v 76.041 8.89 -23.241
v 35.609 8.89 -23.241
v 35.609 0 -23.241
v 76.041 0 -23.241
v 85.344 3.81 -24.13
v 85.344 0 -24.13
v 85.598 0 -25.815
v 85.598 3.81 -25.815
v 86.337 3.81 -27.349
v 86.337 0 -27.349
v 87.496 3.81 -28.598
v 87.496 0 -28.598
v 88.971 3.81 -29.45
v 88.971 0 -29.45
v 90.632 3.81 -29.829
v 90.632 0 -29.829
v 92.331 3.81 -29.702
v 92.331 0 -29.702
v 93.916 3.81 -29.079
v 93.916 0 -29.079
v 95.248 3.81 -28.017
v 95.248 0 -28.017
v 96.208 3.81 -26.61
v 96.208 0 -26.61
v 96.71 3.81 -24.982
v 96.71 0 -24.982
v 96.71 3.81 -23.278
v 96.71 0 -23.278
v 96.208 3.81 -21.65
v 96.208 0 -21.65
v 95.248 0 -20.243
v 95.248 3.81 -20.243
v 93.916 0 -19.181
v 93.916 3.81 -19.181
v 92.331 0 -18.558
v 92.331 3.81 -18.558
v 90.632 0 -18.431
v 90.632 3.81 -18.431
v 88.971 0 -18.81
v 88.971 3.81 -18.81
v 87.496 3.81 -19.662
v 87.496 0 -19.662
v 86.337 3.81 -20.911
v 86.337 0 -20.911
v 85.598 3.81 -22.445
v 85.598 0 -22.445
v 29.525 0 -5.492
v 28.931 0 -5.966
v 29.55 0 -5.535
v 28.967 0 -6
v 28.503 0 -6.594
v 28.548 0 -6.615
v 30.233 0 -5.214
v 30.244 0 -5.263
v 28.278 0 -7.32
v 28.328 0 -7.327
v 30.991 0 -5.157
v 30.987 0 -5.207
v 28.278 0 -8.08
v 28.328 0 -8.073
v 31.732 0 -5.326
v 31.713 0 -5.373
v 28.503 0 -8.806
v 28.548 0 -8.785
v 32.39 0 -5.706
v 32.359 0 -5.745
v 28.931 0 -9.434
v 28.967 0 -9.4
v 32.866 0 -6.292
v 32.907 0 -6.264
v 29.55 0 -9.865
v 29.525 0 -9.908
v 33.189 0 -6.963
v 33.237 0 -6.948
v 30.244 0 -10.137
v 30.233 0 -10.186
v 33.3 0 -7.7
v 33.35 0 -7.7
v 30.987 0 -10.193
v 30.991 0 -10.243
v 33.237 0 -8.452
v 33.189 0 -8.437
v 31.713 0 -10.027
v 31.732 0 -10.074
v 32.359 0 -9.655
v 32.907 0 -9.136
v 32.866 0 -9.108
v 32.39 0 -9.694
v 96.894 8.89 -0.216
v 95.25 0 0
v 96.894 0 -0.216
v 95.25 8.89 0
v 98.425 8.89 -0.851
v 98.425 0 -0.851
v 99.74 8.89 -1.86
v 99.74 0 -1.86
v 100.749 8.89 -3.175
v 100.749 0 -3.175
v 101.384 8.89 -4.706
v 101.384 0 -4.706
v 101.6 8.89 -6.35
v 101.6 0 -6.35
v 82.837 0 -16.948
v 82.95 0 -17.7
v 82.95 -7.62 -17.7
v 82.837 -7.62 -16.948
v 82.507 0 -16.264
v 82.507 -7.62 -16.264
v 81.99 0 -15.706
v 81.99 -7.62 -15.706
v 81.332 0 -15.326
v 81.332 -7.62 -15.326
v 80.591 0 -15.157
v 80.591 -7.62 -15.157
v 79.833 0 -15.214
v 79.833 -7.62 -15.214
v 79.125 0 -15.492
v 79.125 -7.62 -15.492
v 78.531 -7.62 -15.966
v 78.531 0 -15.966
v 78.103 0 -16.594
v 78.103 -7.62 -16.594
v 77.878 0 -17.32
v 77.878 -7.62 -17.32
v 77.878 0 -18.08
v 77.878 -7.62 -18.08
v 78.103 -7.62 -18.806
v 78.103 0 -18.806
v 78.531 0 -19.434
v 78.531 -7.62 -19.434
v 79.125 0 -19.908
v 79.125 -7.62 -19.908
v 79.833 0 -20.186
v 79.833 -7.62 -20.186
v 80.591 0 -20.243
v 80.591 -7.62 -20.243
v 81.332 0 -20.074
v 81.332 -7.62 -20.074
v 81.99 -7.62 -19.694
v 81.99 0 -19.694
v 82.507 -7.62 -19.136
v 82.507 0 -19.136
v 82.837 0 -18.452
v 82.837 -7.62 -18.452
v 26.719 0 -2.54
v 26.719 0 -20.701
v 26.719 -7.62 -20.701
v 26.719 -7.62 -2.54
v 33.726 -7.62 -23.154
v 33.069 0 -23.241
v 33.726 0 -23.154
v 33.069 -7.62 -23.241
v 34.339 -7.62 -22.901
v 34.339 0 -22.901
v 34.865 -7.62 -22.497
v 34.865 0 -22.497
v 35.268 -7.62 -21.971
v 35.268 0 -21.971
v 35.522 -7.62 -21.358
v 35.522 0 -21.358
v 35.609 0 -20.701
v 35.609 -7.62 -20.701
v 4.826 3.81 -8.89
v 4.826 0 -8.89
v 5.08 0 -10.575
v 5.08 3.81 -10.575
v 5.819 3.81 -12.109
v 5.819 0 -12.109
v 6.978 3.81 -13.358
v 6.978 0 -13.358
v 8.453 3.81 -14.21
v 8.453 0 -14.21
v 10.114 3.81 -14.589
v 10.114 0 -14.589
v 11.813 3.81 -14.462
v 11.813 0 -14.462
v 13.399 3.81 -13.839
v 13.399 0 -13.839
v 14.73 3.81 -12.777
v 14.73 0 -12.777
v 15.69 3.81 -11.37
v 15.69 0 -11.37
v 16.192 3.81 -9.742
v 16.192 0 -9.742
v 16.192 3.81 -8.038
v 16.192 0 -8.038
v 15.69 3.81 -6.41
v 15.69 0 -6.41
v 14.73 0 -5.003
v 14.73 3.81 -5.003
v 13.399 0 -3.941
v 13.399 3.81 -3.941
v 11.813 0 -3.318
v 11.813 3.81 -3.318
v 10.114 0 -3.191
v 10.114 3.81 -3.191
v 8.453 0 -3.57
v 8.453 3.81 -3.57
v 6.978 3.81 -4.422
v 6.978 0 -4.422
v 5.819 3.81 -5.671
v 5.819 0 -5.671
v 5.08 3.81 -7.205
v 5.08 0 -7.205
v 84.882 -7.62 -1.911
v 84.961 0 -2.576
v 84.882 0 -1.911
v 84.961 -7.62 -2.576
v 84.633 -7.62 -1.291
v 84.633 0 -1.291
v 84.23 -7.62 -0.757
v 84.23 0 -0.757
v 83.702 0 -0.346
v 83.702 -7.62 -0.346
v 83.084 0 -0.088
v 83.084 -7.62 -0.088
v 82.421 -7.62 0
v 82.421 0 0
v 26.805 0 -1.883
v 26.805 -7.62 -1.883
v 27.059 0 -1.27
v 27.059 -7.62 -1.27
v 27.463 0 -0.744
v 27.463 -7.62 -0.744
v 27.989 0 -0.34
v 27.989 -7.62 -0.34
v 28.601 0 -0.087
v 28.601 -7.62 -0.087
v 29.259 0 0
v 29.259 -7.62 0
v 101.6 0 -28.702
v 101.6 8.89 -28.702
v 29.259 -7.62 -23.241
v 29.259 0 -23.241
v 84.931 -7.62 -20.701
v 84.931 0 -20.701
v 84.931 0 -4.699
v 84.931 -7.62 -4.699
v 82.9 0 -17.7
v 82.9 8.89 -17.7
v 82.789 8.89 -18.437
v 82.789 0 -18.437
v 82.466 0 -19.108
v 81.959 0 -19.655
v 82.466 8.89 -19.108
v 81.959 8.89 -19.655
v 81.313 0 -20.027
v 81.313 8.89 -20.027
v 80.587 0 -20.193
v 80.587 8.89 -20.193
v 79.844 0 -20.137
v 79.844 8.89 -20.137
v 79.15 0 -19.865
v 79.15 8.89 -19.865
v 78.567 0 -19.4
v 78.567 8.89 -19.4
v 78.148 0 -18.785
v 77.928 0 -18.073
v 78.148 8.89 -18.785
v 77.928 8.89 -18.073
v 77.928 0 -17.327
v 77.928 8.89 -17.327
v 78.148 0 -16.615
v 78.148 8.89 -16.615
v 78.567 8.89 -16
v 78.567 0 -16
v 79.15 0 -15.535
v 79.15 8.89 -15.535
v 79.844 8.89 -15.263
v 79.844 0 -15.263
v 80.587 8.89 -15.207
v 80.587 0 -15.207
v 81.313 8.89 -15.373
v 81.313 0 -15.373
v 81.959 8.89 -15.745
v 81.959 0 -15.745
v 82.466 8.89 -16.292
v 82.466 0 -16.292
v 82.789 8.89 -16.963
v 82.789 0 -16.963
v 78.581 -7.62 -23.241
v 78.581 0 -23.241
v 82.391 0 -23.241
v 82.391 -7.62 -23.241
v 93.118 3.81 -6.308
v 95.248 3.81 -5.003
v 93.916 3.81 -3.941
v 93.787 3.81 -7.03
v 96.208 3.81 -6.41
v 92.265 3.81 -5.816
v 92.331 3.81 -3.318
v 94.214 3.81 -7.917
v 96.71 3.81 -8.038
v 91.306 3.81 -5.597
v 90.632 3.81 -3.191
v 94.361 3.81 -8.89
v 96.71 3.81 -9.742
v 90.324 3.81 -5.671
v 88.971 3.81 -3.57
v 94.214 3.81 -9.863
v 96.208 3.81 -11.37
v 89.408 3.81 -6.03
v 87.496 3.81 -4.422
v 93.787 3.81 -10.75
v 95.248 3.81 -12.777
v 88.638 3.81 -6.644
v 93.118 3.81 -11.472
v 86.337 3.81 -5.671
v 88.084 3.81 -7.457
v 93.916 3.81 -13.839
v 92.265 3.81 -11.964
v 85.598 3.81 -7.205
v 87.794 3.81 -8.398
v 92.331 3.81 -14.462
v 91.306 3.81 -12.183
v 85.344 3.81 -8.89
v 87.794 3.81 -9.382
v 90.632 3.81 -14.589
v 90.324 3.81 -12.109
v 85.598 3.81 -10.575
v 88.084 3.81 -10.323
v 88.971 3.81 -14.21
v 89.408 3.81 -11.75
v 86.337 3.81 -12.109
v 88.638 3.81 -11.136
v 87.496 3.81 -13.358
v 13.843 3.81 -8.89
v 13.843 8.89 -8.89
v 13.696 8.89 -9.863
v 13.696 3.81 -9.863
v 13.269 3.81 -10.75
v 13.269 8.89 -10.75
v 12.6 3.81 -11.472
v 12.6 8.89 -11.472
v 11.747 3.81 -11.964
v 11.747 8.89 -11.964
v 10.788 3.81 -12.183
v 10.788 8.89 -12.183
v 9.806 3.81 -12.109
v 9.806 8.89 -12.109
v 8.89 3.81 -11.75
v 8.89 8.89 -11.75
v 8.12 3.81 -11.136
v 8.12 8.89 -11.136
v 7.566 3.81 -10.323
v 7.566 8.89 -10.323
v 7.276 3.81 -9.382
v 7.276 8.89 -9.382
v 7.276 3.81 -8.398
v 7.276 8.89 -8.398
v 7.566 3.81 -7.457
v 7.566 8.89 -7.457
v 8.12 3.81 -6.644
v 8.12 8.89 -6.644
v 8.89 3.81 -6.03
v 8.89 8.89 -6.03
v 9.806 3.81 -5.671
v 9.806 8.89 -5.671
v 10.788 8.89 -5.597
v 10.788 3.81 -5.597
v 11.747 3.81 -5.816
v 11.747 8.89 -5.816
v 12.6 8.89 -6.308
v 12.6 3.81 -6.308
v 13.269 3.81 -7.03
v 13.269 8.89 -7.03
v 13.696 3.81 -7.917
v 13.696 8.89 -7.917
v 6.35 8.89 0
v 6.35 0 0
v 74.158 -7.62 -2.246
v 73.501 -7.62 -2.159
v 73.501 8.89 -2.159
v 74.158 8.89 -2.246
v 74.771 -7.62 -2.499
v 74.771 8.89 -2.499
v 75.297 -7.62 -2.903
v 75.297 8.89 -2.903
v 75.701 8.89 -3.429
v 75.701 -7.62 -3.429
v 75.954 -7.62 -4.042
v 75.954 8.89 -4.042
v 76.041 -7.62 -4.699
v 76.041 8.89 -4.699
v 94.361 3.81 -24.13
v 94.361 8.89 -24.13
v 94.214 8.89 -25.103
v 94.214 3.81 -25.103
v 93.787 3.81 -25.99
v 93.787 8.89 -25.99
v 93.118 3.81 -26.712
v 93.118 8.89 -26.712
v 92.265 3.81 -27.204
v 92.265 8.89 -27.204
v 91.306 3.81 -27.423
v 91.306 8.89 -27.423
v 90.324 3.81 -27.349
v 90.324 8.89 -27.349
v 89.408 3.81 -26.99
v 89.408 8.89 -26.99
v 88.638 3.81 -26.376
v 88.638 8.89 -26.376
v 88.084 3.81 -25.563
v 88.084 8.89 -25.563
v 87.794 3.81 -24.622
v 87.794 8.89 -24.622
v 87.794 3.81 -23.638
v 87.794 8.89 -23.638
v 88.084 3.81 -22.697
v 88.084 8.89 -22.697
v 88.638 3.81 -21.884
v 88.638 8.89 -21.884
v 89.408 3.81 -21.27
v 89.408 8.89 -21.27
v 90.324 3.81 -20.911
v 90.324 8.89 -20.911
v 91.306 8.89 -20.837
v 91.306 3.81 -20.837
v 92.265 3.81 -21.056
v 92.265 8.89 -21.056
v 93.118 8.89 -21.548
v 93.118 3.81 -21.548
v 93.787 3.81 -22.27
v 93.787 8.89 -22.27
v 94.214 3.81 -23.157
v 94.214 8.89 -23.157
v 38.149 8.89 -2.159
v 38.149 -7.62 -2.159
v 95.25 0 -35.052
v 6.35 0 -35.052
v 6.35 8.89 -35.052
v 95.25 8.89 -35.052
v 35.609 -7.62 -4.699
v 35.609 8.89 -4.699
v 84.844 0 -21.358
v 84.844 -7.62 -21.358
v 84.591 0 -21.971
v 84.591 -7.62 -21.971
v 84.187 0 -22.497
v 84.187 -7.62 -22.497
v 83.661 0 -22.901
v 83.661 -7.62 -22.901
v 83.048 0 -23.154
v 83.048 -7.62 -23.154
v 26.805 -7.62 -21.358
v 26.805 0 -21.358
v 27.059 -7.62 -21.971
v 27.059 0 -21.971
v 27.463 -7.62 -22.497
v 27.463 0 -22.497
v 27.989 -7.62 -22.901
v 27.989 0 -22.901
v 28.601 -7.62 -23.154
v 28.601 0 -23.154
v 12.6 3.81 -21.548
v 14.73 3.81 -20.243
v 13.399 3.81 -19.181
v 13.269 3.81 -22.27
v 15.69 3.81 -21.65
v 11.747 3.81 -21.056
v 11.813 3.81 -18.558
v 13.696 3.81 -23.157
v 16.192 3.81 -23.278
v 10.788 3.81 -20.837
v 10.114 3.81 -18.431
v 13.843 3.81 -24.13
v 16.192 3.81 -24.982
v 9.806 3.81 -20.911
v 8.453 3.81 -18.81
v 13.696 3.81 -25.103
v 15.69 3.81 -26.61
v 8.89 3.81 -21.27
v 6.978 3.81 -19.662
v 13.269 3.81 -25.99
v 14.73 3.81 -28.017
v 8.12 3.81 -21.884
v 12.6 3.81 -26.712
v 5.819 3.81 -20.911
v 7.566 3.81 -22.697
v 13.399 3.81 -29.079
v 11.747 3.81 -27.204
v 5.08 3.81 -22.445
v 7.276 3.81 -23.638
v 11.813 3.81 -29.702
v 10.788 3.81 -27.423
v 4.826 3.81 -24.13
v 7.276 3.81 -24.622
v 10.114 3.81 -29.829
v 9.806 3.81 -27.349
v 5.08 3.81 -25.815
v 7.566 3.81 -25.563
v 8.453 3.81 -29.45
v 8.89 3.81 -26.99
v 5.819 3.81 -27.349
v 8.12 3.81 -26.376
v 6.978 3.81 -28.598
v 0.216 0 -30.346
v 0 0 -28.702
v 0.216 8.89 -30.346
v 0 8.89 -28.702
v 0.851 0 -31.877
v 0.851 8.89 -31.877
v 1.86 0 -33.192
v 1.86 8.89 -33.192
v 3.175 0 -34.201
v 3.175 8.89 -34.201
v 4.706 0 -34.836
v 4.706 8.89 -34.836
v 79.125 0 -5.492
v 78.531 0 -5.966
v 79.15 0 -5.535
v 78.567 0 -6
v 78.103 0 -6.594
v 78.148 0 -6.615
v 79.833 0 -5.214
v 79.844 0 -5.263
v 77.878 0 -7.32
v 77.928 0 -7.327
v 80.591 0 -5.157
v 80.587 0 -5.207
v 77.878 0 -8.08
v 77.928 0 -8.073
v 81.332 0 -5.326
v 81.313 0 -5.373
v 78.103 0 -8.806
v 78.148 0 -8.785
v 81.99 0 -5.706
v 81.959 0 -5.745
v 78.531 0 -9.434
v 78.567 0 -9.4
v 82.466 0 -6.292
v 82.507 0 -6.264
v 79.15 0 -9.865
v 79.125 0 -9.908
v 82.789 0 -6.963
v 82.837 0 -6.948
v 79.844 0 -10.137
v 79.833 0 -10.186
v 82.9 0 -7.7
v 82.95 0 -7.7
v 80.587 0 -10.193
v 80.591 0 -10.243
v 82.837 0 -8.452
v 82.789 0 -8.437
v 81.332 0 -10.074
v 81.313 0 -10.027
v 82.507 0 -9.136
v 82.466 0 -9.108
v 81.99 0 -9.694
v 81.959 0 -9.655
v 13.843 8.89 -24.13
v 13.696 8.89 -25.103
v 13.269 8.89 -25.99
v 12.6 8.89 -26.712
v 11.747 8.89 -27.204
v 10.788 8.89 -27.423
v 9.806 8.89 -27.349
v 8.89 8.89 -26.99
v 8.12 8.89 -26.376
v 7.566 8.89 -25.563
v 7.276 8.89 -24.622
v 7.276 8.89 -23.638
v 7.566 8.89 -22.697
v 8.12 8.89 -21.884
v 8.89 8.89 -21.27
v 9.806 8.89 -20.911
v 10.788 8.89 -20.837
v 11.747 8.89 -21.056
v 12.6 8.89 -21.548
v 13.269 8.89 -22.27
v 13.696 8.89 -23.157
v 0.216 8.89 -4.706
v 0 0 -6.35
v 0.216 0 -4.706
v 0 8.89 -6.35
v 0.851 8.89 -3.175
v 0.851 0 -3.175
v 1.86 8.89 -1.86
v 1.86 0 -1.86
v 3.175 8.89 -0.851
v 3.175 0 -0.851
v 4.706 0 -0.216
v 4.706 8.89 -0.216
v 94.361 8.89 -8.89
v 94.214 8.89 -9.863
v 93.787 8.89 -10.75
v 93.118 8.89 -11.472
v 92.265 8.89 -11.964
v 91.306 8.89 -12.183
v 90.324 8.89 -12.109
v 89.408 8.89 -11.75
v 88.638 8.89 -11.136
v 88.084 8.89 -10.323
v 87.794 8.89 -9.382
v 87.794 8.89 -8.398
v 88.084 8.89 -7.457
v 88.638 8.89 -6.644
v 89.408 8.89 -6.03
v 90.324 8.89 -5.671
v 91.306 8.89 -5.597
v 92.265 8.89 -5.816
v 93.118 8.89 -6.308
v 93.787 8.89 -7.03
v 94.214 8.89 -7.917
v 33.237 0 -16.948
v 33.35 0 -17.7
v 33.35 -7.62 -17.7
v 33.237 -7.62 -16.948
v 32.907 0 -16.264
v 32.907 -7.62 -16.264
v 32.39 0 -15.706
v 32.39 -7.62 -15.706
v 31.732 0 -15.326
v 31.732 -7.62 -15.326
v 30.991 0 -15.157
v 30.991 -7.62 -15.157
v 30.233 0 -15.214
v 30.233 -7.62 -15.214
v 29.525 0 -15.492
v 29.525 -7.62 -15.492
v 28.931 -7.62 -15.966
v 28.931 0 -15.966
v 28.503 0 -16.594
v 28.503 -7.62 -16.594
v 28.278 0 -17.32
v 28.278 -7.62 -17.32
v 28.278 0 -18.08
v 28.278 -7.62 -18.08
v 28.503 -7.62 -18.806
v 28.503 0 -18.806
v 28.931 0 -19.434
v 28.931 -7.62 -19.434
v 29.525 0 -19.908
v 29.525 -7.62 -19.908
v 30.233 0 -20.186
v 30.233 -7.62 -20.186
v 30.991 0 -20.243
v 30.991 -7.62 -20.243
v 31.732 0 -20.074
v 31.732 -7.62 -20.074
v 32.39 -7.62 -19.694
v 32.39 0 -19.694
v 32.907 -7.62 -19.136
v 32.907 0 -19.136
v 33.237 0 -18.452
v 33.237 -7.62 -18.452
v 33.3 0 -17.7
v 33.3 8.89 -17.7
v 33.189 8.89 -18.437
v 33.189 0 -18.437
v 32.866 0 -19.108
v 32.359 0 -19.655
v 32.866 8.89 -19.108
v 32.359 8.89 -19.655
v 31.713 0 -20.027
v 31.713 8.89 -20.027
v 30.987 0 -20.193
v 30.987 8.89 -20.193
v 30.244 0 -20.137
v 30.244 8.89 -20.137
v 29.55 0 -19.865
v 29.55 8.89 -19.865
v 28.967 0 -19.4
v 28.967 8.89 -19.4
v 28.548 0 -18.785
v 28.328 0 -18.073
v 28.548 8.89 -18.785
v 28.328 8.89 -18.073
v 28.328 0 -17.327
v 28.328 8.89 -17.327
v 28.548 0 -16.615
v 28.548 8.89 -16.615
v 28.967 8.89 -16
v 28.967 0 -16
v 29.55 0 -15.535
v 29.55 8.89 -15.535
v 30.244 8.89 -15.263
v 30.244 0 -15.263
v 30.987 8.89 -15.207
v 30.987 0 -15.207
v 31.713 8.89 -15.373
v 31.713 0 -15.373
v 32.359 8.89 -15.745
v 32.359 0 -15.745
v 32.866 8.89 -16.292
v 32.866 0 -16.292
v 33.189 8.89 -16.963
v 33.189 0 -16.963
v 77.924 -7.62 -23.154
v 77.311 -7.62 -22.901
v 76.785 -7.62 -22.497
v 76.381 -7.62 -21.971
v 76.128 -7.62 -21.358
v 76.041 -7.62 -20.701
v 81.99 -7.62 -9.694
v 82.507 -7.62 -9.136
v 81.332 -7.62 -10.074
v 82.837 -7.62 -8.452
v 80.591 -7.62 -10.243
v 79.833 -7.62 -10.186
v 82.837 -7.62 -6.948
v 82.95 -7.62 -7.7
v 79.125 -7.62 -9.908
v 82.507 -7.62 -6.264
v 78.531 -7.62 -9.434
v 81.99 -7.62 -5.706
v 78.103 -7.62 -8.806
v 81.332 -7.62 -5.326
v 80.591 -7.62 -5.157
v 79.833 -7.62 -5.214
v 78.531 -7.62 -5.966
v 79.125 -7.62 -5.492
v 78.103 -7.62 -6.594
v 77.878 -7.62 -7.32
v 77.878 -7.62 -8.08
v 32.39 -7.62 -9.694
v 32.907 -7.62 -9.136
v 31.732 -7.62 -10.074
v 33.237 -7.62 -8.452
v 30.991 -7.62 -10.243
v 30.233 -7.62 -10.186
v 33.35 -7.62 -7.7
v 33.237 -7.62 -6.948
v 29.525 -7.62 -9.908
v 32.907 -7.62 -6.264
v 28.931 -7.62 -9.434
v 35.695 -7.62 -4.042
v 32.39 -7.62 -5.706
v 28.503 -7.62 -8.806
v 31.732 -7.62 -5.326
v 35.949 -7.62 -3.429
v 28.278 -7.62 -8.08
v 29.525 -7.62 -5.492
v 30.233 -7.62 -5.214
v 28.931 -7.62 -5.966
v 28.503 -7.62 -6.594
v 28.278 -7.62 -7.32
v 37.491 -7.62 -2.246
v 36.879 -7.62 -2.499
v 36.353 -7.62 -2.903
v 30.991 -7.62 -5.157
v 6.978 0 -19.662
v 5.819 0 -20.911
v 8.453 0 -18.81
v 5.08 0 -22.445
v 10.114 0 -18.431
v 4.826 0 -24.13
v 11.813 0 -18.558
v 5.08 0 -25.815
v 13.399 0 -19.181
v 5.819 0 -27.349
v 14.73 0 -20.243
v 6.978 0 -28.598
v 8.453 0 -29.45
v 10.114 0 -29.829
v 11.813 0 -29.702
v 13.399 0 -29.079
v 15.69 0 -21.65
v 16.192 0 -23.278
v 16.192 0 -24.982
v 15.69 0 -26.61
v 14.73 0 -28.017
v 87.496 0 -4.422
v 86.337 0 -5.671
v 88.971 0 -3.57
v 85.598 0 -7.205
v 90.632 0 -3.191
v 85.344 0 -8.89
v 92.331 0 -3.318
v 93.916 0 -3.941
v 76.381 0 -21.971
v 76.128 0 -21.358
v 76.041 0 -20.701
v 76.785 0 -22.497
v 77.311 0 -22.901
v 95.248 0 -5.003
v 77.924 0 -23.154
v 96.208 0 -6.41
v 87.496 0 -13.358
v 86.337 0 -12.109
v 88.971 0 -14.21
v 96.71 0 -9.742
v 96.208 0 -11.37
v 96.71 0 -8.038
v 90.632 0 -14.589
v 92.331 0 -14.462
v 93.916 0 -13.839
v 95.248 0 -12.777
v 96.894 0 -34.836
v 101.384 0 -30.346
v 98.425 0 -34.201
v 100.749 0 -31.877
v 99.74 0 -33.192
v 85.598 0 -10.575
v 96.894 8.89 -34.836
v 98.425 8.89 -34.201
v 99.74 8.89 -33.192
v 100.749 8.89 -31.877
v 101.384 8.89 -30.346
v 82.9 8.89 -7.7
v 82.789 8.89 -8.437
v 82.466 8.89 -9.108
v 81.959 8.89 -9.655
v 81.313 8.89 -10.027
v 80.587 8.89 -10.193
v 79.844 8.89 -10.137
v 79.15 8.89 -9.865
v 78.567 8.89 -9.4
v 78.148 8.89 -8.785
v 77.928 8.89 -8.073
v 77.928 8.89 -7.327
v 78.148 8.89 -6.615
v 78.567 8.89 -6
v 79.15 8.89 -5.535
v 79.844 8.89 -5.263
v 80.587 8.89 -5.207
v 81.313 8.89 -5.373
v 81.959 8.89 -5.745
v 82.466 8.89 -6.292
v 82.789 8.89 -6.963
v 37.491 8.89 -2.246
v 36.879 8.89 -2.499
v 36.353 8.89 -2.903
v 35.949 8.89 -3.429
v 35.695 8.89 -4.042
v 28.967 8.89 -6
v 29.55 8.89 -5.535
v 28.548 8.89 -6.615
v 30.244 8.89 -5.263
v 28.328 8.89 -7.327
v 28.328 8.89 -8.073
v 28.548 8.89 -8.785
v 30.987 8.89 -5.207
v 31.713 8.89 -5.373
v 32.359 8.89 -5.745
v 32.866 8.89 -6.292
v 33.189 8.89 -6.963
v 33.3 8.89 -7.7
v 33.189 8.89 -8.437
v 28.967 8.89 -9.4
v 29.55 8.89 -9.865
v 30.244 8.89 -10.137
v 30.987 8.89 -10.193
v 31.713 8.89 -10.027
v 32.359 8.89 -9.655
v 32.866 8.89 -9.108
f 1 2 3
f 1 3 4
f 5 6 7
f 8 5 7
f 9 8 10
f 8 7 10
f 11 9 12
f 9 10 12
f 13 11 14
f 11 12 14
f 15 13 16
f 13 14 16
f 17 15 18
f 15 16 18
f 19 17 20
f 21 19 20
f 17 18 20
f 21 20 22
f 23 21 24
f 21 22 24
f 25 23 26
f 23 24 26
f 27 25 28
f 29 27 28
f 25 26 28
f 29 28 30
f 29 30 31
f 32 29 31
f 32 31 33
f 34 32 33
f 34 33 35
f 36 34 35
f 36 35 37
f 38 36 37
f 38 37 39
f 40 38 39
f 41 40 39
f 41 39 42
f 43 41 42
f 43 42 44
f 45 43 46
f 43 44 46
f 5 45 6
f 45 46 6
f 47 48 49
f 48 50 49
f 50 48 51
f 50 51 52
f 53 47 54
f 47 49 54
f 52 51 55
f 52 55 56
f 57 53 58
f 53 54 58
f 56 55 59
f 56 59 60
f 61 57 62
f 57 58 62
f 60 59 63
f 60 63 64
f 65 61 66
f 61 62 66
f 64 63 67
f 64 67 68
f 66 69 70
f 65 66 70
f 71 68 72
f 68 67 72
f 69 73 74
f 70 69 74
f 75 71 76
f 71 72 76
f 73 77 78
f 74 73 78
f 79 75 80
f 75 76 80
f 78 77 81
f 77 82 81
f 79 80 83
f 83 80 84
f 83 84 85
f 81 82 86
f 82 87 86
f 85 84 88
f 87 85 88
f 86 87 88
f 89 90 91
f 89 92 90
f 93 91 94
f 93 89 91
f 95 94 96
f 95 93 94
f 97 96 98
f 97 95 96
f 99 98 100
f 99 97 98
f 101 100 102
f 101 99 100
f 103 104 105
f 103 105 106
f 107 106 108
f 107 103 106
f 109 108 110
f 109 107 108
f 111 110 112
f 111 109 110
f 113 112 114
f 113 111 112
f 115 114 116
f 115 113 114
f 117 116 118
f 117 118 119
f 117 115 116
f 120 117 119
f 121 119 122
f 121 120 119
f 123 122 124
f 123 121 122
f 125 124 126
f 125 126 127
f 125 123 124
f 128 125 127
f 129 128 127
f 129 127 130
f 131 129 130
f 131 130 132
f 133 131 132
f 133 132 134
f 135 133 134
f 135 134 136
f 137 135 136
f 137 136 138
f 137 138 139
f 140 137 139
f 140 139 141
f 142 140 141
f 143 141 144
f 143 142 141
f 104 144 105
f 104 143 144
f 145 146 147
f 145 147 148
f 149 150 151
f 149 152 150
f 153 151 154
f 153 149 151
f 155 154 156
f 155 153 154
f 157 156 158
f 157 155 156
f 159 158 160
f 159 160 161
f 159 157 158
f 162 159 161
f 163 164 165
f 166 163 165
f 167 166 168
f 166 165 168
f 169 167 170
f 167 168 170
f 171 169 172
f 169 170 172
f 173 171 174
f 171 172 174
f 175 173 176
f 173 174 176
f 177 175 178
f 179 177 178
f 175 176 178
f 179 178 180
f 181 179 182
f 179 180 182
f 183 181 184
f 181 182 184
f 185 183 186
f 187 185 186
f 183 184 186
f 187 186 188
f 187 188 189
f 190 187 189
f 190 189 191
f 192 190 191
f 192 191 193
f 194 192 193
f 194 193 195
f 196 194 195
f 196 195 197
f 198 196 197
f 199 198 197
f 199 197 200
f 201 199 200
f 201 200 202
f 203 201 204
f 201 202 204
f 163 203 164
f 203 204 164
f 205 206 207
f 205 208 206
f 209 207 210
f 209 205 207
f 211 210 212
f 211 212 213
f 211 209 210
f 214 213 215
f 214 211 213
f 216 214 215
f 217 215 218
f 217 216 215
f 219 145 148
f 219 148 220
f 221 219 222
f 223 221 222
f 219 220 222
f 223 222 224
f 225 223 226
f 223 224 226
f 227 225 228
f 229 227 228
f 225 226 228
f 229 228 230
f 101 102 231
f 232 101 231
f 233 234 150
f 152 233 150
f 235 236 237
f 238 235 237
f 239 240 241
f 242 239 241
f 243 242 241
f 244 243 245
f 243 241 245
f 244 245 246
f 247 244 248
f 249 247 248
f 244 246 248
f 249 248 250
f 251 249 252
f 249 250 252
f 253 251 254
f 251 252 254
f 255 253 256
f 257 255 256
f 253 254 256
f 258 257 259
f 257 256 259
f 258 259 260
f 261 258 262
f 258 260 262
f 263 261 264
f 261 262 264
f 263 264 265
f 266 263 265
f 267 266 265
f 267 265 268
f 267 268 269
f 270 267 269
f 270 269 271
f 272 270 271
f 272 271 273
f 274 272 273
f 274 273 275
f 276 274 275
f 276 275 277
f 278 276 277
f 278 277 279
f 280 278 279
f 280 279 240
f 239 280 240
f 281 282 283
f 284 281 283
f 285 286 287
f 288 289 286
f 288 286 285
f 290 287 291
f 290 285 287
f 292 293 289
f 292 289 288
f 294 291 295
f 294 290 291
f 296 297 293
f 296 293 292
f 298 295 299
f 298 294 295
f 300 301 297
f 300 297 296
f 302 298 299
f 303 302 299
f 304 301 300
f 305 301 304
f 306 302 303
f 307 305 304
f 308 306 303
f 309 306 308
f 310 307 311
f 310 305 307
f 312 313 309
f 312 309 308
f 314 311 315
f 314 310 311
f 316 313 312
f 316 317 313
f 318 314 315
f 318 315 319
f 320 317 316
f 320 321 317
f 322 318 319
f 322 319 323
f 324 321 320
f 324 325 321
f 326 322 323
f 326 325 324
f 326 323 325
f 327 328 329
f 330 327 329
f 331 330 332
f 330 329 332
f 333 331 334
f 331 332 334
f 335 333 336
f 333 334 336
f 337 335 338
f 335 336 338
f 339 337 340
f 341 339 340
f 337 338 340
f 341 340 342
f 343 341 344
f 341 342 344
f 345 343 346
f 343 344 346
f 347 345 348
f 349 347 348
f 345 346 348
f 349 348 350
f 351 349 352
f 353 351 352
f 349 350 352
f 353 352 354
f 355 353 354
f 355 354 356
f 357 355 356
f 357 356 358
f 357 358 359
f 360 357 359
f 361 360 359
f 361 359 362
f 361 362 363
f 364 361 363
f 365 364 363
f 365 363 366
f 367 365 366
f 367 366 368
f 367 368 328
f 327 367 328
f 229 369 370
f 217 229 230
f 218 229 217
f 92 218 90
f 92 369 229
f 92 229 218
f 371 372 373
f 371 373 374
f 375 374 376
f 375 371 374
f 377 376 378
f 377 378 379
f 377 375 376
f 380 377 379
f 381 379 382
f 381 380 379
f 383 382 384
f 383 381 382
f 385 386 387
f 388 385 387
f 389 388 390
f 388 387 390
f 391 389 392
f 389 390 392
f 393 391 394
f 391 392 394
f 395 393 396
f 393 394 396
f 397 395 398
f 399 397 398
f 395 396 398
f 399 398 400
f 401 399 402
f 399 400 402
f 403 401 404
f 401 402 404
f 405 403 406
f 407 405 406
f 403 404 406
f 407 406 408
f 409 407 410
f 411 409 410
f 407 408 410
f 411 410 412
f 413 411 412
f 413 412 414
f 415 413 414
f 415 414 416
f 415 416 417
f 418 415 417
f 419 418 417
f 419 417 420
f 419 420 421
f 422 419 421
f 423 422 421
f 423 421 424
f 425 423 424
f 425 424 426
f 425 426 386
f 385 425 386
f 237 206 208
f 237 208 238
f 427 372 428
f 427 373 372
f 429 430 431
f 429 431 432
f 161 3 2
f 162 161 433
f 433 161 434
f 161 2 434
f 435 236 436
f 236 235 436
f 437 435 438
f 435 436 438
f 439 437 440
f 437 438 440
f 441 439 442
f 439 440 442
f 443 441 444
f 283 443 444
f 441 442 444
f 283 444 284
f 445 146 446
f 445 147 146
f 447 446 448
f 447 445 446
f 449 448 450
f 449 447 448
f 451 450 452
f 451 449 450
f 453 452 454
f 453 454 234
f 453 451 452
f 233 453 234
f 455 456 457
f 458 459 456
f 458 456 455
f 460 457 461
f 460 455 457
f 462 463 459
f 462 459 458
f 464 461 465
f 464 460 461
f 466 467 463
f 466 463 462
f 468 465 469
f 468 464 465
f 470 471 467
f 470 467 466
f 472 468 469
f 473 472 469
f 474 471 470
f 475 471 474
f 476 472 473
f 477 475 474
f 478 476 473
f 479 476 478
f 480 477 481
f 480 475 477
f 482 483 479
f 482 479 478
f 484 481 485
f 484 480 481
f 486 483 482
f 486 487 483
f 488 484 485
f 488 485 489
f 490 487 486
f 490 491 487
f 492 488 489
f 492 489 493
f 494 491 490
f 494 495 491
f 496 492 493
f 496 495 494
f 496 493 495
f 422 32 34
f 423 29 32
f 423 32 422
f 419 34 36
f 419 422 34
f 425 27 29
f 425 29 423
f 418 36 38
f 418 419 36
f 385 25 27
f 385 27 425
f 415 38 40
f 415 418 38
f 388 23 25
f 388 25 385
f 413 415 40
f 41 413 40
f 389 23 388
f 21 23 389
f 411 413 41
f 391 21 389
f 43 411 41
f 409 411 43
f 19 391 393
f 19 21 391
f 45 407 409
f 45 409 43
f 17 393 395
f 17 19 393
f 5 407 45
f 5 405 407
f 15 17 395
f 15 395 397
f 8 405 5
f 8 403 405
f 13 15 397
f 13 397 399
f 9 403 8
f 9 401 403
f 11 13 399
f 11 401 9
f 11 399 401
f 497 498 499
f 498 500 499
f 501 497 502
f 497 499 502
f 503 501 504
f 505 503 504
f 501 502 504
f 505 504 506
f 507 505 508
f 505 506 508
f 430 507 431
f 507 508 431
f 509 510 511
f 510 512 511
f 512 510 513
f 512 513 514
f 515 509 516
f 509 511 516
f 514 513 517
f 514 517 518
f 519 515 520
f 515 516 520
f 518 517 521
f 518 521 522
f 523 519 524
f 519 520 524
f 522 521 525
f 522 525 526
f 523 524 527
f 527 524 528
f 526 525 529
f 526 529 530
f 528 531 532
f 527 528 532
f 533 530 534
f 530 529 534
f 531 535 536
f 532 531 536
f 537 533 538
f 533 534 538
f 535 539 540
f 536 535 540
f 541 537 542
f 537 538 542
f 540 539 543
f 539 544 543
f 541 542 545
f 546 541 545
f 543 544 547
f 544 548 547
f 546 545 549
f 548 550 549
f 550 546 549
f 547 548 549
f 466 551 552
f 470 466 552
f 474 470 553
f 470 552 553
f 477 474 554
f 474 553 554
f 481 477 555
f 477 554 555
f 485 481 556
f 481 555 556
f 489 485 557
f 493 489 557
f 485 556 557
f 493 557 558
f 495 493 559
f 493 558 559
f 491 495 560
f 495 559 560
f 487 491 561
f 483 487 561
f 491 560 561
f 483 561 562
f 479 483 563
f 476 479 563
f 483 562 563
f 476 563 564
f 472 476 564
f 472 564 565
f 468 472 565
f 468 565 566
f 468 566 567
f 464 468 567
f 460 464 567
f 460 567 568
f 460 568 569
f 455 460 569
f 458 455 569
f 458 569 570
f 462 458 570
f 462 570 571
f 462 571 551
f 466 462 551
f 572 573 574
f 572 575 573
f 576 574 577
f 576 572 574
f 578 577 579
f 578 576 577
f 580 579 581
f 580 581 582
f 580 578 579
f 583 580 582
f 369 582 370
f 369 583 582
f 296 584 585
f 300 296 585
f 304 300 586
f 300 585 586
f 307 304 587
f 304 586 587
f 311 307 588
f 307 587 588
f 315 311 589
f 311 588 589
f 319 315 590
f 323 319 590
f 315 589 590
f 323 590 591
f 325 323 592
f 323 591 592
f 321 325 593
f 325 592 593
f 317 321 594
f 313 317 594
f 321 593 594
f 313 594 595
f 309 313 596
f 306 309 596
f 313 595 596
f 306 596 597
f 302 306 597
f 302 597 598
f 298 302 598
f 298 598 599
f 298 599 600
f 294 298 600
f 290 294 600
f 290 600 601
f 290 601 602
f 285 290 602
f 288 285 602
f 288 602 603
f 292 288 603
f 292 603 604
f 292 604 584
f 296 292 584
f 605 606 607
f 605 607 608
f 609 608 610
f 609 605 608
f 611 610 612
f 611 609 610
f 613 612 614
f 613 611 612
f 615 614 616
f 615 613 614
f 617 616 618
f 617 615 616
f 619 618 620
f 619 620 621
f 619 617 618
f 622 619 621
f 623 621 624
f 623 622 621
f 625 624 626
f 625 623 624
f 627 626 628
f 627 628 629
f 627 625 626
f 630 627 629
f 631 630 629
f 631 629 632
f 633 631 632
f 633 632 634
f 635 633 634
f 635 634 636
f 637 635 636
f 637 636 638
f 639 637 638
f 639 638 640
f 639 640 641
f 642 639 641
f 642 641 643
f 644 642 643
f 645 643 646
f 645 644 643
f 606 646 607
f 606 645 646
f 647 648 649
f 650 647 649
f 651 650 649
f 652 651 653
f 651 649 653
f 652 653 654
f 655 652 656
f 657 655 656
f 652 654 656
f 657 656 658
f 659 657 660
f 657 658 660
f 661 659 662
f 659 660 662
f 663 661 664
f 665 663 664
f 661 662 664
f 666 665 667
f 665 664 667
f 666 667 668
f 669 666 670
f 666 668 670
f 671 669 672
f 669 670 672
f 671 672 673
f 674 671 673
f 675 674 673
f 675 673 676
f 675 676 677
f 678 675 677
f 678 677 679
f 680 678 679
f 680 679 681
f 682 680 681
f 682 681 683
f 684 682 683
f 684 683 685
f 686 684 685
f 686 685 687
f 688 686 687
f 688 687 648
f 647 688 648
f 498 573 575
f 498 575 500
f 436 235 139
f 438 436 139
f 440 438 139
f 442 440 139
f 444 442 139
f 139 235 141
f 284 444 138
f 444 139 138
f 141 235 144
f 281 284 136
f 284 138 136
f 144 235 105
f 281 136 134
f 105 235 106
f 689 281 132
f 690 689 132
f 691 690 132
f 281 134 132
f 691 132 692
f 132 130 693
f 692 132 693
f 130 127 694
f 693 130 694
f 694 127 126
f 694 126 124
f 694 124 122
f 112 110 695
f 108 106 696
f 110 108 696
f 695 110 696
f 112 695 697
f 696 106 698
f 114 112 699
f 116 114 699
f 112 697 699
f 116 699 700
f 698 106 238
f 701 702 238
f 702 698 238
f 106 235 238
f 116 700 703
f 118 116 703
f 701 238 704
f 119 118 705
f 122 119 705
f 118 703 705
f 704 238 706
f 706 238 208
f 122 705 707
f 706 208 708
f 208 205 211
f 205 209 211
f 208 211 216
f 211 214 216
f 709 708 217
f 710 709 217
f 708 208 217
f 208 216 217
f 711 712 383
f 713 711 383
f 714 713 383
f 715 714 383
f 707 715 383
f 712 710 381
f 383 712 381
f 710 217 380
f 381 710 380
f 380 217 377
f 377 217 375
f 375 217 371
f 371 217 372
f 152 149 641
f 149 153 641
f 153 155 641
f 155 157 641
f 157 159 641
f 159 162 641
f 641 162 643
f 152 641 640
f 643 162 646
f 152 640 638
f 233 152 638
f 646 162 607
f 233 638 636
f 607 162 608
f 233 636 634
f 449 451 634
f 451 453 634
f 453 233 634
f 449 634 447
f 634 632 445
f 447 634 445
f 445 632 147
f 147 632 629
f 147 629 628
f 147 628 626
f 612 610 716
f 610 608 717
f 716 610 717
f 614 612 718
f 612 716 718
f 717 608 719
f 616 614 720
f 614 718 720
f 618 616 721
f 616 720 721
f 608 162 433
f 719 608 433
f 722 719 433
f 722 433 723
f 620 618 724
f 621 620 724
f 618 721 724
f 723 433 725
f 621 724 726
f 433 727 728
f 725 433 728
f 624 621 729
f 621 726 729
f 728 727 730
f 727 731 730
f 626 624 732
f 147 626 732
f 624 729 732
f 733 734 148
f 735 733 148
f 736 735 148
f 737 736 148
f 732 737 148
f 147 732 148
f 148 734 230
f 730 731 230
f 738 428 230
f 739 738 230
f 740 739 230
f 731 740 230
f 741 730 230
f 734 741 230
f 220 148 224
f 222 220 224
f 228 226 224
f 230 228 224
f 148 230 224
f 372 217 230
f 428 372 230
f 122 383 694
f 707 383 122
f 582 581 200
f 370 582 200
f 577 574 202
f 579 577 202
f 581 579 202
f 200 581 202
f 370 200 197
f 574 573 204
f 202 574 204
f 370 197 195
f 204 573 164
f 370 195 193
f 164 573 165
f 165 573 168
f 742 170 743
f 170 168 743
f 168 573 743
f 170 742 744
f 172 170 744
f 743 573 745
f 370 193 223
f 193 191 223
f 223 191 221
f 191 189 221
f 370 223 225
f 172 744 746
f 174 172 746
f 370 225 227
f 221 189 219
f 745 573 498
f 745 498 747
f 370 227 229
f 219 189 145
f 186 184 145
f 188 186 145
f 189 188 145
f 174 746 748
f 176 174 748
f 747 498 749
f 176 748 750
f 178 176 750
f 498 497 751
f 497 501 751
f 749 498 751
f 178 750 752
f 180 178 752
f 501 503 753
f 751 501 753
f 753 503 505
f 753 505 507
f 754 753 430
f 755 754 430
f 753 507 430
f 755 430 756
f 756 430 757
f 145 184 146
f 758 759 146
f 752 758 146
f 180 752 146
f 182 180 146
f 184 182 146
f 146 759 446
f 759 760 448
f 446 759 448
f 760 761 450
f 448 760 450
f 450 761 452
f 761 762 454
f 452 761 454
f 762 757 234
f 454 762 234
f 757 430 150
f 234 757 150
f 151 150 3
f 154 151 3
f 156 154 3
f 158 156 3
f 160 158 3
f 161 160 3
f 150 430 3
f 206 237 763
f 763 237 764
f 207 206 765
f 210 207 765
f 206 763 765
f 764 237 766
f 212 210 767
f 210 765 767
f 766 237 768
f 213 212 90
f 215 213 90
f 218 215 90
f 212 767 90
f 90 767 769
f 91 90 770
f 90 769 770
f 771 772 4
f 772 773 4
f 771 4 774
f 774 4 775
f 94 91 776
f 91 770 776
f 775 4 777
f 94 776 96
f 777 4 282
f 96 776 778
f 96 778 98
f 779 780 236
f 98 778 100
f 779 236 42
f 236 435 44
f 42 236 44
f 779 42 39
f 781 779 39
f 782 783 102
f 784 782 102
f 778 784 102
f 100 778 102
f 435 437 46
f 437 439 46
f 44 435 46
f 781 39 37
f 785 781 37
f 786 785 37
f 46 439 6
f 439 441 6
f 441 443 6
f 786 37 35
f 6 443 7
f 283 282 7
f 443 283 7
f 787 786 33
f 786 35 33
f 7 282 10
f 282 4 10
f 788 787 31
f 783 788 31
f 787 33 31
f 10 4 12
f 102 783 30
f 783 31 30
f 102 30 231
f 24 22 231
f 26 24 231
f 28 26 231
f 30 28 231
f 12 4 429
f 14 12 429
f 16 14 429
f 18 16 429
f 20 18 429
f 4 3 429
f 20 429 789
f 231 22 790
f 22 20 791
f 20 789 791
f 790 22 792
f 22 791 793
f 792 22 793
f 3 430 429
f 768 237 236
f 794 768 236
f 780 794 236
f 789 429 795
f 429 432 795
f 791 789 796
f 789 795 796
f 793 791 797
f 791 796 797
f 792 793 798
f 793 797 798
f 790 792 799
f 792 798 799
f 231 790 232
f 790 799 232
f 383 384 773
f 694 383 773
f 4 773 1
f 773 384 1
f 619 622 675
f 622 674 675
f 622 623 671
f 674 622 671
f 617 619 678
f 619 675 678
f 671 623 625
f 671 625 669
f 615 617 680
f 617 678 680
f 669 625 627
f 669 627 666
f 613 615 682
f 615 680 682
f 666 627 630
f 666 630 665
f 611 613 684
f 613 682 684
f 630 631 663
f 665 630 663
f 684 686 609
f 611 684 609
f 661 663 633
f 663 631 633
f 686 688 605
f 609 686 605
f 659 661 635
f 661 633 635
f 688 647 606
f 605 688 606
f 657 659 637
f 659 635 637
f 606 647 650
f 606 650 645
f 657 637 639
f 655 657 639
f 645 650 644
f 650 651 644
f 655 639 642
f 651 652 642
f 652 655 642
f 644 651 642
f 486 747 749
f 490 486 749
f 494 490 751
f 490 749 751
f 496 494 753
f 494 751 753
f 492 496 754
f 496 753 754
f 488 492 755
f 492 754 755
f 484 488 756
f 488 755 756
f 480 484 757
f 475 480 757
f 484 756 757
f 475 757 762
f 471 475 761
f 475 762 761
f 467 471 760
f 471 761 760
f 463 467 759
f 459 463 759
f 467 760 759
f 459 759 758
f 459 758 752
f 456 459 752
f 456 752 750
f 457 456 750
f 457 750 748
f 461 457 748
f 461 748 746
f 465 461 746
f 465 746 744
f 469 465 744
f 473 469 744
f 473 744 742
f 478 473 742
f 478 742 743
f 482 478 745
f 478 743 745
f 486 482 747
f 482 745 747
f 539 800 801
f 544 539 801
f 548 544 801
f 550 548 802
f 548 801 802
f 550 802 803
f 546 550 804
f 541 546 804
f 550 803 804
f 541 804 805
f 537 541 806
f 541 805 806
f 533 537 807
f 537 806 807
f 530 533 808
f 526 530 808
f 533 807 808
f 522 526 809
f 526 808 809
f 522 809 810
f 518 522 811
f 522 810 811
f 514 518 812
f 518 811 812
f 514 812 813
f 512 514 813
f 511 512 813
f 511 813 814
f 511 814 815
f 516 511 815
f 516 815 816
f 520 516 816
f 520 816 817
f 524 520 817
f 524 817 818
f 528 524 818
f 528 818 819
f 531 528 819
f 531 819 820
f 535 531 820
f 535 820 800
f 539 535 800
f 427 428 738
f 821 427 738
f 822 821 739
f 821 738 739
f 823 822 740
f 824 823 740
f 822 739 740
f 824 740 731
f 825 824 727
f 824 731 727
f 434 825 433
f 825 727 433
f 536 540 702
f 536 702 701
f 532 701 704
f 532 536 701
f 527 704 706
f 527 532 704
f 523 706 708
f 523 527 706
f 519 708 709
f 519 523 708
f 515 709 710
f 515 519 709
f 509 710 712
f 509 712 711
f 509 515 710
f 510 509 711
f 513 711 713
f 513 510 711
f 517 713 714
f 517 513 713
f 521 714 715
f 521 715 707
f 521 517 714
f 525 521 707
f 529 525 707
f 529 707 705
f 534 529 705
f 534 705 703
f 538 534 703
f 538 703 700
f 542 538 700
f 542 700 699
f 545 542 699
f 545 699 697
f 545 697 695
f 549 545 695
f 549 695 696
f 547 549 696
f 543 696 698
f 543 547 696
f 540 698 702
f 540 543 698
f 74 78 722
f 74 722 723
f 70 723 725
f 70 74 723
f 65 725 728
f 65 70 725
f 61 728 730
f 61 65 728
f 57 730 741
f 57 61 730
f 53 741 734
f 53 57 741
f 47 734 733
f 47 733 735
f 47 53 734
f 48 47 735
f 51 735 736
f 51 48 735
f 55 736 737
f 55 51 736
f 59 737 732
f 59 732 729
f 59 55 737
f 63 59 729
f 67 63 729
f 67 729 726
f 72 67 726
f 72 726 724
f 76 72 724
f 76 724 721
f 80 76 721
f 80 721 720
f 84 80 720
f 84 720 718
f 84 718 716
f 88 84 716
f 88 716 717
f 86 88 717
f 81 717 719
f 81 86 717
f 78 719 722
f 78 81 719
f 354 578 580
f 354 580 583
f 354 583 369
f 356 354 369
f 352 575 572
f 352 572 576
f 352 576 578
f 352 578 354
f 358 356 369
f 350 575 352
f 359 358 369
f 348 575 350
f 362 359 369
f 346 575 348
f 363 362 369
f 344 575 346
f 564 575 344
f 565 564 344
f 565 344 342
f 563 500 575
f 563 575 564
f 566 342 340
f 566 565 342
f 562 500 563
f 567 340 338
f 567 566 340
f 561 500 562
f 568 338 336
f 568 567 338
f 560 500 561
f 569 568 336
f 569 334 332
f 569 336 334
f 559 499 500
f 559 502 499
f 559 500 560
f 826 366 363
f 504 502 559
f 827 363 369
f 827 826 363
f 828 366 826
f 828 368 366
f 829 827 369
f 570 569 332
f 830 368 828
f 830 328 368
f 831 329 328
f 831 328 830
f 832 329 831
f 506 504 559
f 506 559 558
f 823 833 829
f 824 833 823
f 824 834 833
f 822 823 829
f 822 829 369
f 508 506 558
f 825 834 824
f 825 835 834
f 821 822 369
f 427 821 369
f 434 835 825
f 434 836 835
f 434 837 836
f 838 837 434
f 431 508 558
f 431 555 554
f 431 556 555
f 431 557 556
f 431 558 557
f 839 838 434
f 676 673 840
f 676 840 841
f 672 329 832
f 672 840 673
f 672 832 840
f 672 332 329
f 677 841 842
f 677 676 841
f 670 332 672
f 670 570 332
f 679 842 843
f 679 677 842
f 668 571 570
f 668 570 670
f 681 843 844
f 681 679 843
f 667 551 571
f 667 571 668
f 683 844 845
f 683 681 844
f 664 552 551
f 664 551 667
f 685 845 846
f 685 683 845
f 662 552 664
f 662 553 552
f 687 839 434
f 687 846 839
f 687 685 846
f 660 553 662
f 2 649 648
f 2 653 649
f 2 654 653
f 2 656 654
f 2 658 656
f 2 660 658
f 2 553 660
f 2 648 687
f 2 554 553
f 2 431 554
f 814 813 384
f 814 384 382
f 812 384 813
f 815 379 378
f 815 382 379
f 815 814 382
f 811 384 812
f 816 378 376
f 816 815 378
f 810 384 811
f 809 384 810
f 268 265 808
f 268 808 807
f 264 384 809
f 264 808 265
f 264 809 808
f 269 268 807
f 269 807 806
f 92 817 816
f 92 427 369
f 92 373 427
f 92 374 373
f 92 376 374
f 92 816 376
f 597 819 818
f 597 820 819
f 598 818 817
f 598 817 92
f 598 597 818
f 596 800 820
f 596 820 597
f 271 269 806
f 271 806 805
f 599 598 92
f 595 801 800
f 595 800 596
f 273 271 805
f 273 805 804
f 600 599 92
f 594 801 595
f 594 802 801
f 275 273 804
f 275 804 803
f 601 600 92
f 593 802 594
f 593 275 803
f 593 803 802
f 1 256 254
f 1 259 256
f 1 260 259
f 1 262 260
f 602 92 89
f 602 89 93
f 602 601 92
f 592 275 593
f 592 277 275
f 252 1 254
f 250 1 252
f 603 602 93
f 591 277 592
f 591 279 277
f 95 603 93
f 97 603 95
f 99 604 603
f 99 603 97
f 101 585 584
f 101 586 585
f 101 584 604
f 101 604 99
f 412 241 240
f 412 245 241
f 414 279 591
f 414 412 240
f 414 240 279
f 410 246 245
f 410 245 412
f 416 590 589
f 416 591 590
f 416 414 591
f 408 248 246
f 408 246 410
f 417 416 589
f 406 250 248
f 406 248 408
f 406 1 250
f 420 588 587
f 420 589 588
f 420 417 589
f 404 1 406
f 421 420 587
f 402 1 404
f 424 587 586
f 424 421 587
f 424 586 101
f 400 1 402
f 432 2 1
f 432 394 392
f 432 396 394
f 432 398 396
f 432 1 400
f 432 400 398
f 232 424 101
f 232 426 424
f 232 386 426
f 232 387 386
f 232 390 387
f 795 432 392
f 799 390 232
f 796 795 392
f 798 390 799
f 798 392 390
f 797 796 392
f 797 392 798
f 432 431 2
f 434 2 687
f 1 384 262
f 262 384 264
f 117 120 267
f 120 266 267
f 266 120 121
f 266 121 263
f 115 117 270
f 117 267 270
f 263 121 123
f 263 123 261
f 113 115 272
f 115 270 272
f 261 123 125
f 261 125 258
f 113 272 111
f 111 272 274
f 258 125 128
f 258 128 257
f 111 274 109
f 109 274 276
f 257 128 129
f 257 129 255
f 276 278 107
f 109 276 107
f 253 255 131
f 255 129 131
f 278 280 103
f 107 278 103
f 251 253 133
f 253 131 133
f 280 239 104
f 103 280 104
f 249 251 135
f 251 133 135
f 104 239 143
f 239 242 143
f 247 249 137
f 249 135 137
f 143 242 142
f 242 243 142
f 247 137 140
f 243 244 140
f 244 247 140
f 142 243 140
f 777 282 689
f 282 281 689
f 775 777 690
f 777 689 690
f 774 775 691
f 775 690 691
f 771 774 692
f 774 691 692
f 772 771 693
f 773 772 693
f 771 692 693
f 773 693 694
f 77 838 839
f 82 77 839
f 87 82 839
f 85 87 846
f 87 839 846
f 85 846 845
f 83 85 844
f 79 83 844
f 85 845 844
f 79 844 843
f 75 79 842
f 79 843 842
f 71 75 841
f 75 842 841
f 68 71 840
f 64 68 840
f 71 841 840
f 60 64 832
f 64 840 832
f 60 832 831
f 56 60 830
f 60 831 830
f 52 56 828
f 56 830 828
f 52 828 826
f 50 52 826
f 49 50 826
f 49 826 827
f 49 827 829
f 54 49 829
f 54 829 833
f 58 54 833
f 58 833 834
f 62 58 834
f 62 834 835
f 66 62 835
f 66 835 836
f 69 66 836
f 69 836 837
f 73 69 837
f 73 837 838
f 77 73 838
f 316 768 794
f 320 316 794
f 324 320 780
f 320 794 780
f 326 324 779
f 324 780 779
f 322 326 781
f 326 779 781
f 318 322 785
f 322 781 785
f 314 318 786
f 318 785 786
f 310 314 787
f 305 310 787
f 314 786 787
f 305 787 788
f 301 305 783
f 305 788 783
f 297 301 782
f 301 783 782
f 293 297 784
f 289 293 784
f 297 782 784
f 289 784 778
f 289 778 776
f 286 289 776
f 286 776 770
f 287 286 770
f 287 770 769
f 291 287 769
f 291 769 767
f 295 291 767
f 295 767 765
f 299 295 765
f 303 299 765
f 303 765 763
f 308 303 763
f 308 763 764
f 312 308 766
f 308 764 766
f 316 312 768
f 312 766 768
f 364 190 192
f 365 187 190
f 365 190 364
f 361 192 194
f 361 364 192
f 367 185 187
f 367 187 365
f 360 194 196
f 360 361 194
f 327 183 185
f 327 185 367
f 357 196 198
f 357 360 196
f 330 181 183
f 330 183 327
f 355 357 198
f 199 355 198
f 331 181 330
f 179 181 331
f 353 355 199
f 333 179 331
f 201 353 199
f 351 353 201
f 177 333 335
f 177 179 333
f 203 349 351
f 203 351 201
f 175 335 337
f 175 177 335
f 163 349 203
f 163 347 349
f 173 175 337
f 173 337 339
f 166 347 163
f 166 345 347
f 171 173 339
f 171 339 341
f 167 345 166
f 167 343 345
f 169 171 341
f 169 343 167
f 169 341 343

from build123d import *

# Parameters (mm, degrees)
SKETCH1_W             = 101.6
SKETCH1_H             = 35.052
INITIAL_EXTRUDE_DEPTH = 8.89
SKETCH2_R             = 3.302
SCREW_HOLES_DEPTH     = 9.89
SKETCH4_R             = 2.5
SKETCH4_W             = 40.432286119
SKETCH4_H             = 21.082
SERVO_HOLE_DEPTH      = 9.89
FILLET1_R             = 6.35
SKETCH6_R             = 5.715
SCREW_HEAD_HOLE_DEPTH = 3.81
SKETCH7_W             = 8.89
SKETCH7_H             = 21.082
SKETCH7_R             = 2.55
BOSS_EXTRUDE1_DEPTH   = 7.62
FILLET2_R             = 2.54
BOSS_EXTRUDE2_DEPTH   = 7.62
FILLET3_R             = 2.54


with BuildPart() as part:
    # Sketch1 → Initial Extrude (new body)
    with BuildSketch(Plane(origin=(0, 0, 0), x_dir=(1, 0, 0), z_dir=(0, 1, 0))):
        with Locations((50.8, 17.526)):
            Rectangle(SKETCH1_W, SKETCH1_H)
    extrude(amount=INITIAL_EXTRUDE_DEPTH)

    # Sketch2 → Screw Holes (cut, through all)
    with BuildSketch(Plane(origin=(0, 8.89, 0), x_dir=(1, 0, 0), z_dir=(0, 1, 0))):
        with Locations((10.541, 8.89)):
            Circle(SKETCH2_R)
        with Locations((91.059, 24.13)):
            Circle(SKETCH2_R)
        with Locations((10.541, 24.13)):
            Circle(SKETCH2_R)
        with Locations((91.059, 8.89)):
            Circle(SKETCH2_R)
    extrude(amount=-SCREW_HOLES_DEPTH, mode=Mode.SUBTRACT)

    # Sketch4 → Servo Hole (cut, through all)
    with BuildSketch(Plane(origin=(0, 8.89, 0), x_dir=(1, 0, 0), z_dir=(0, 1, 0))):
        with Locations((30.8, 7.7)):
            Circle(SKETCH4_R)
        with Locations((30.8, 17.7)):
            Circle(SKETCH4_R)
        with Locations((55.824856941, 12.7)):
            Rectangle(SKETCH4_W, SKETCH4_H)
        with Locations((80.4, 17.7)):
            Circle(SKETCH4_R)
        with Locations((80.4, 7.7)):
            Circle(SKETCH4_R)
    extrude(amount=-SERVO_HOLE_DEPTH, mode=Mode.SUBTRACT)

    # Fillet1
    fillet1_edges = [part.edges().sort_by_distance(p)[0] for p in [
        (0, 4.445, 0),
        (0, 4.445, -35.052),
        (101.6, 4.445, -35.052),
        (101.6, 4.445, 0),
    ]]
    fillet(fillet1_edges, radius=FILLET1_R)

    # Sketch6 → Screw Head Hole (cut)
    with BuildSketch(Plane(origin=(0, 0, 0), x_dir=(-1, 0, 0), z_dir=(0, -1, 0))):
        with Locations((-10.541, 8.89)):
            Circle(SKETCH6_R)
        with Locations((-10.541, 24.13)):
            Circle(SKETCH6_R)
        with Locations((-91.059, 24.13)):
            Circle(SKETCH6_R)
        with Locations((-91.059, 8.89)):
            Circle(SKETCH6_R)
    extrude(amount=-SCREW_HEAD_HOLE_DEPTH, mode=Mode.SUBTRACT)

    # Sketch7 → Boss-Extrude1 (add)
    with BuildSketch(Plane.XZ):
        with Locations((31.163713881, -12.7)):
            Rectangle(SKETCH7_W, SKETCH7_H)
        with Locations((30.8, -7.7)):
            Circle(SKETCH7_R, mode=Mode.SUBTRACT)
        with Locations((30.8, -17.7)):
            Circle(SKETCH7_R, mode=Mode.SUBTRACT)
        with Locations((80.486, -12.7)):
            Rectangle(SKETCH7_W, SKETCH7_H)
        with Locations((80.4, -7.7)):
            Circle(SKETCH7_R, mode=Mode.SUBTRACT)
        with Locations((80.4, -17.7)):
            Circle(SKETCH7_R, mode=Mode.SUBTRACT)
    extrude(amount=BOSS_EXTRUDE1_DEPTH)

    # Fillet2
    fillet2_edges = [part.edges().sort_by_distance(p)[0] for p in [
        (35.608713881, -3.81, -23.241),
        (35.608713881, -3.81, -2.159),
        (26.718713881, -3.81, -2.159),
        (26.718713881, -3.81, -23.241),
        (76.041, -3.81, -2.159),
        (76.041, -3.81, -23.241),
        (84.931, -3.81, -23.241),
        (84.931, -3.81, -2.159),
    ]]
    fillet(fillet2_edges, radius=FILLET2_R)

    # Sketch8 → Boss-Extrude2 (add)
    with BuildSketch(Plane.XZ):
        Polygon((26.718713881, -4.699), (26.718713881, 0), (84.997322511, 0), (84.931, -4.699), (76.041, -4.699), (76.041, -2.159), (35.608713881, -2.159), (35.608713881, -4.699), align=None)
    extrude(amount=BOSS_EXTRUDE2_DEPTH)

    # Fillet3
    fillet3_edges = [part.edges().sort_by_distance(p)[0] for p in [
        (26.718713881, -3.81, 0),
        (84.997322511, -3.81, 0),
        (76.041, 0.635, -2.159),
        (35.608713881, 0.635, -2.159),
    ]]
    fillet(fillet3_edges, radius=FILLET3_R)


solid = part.part
